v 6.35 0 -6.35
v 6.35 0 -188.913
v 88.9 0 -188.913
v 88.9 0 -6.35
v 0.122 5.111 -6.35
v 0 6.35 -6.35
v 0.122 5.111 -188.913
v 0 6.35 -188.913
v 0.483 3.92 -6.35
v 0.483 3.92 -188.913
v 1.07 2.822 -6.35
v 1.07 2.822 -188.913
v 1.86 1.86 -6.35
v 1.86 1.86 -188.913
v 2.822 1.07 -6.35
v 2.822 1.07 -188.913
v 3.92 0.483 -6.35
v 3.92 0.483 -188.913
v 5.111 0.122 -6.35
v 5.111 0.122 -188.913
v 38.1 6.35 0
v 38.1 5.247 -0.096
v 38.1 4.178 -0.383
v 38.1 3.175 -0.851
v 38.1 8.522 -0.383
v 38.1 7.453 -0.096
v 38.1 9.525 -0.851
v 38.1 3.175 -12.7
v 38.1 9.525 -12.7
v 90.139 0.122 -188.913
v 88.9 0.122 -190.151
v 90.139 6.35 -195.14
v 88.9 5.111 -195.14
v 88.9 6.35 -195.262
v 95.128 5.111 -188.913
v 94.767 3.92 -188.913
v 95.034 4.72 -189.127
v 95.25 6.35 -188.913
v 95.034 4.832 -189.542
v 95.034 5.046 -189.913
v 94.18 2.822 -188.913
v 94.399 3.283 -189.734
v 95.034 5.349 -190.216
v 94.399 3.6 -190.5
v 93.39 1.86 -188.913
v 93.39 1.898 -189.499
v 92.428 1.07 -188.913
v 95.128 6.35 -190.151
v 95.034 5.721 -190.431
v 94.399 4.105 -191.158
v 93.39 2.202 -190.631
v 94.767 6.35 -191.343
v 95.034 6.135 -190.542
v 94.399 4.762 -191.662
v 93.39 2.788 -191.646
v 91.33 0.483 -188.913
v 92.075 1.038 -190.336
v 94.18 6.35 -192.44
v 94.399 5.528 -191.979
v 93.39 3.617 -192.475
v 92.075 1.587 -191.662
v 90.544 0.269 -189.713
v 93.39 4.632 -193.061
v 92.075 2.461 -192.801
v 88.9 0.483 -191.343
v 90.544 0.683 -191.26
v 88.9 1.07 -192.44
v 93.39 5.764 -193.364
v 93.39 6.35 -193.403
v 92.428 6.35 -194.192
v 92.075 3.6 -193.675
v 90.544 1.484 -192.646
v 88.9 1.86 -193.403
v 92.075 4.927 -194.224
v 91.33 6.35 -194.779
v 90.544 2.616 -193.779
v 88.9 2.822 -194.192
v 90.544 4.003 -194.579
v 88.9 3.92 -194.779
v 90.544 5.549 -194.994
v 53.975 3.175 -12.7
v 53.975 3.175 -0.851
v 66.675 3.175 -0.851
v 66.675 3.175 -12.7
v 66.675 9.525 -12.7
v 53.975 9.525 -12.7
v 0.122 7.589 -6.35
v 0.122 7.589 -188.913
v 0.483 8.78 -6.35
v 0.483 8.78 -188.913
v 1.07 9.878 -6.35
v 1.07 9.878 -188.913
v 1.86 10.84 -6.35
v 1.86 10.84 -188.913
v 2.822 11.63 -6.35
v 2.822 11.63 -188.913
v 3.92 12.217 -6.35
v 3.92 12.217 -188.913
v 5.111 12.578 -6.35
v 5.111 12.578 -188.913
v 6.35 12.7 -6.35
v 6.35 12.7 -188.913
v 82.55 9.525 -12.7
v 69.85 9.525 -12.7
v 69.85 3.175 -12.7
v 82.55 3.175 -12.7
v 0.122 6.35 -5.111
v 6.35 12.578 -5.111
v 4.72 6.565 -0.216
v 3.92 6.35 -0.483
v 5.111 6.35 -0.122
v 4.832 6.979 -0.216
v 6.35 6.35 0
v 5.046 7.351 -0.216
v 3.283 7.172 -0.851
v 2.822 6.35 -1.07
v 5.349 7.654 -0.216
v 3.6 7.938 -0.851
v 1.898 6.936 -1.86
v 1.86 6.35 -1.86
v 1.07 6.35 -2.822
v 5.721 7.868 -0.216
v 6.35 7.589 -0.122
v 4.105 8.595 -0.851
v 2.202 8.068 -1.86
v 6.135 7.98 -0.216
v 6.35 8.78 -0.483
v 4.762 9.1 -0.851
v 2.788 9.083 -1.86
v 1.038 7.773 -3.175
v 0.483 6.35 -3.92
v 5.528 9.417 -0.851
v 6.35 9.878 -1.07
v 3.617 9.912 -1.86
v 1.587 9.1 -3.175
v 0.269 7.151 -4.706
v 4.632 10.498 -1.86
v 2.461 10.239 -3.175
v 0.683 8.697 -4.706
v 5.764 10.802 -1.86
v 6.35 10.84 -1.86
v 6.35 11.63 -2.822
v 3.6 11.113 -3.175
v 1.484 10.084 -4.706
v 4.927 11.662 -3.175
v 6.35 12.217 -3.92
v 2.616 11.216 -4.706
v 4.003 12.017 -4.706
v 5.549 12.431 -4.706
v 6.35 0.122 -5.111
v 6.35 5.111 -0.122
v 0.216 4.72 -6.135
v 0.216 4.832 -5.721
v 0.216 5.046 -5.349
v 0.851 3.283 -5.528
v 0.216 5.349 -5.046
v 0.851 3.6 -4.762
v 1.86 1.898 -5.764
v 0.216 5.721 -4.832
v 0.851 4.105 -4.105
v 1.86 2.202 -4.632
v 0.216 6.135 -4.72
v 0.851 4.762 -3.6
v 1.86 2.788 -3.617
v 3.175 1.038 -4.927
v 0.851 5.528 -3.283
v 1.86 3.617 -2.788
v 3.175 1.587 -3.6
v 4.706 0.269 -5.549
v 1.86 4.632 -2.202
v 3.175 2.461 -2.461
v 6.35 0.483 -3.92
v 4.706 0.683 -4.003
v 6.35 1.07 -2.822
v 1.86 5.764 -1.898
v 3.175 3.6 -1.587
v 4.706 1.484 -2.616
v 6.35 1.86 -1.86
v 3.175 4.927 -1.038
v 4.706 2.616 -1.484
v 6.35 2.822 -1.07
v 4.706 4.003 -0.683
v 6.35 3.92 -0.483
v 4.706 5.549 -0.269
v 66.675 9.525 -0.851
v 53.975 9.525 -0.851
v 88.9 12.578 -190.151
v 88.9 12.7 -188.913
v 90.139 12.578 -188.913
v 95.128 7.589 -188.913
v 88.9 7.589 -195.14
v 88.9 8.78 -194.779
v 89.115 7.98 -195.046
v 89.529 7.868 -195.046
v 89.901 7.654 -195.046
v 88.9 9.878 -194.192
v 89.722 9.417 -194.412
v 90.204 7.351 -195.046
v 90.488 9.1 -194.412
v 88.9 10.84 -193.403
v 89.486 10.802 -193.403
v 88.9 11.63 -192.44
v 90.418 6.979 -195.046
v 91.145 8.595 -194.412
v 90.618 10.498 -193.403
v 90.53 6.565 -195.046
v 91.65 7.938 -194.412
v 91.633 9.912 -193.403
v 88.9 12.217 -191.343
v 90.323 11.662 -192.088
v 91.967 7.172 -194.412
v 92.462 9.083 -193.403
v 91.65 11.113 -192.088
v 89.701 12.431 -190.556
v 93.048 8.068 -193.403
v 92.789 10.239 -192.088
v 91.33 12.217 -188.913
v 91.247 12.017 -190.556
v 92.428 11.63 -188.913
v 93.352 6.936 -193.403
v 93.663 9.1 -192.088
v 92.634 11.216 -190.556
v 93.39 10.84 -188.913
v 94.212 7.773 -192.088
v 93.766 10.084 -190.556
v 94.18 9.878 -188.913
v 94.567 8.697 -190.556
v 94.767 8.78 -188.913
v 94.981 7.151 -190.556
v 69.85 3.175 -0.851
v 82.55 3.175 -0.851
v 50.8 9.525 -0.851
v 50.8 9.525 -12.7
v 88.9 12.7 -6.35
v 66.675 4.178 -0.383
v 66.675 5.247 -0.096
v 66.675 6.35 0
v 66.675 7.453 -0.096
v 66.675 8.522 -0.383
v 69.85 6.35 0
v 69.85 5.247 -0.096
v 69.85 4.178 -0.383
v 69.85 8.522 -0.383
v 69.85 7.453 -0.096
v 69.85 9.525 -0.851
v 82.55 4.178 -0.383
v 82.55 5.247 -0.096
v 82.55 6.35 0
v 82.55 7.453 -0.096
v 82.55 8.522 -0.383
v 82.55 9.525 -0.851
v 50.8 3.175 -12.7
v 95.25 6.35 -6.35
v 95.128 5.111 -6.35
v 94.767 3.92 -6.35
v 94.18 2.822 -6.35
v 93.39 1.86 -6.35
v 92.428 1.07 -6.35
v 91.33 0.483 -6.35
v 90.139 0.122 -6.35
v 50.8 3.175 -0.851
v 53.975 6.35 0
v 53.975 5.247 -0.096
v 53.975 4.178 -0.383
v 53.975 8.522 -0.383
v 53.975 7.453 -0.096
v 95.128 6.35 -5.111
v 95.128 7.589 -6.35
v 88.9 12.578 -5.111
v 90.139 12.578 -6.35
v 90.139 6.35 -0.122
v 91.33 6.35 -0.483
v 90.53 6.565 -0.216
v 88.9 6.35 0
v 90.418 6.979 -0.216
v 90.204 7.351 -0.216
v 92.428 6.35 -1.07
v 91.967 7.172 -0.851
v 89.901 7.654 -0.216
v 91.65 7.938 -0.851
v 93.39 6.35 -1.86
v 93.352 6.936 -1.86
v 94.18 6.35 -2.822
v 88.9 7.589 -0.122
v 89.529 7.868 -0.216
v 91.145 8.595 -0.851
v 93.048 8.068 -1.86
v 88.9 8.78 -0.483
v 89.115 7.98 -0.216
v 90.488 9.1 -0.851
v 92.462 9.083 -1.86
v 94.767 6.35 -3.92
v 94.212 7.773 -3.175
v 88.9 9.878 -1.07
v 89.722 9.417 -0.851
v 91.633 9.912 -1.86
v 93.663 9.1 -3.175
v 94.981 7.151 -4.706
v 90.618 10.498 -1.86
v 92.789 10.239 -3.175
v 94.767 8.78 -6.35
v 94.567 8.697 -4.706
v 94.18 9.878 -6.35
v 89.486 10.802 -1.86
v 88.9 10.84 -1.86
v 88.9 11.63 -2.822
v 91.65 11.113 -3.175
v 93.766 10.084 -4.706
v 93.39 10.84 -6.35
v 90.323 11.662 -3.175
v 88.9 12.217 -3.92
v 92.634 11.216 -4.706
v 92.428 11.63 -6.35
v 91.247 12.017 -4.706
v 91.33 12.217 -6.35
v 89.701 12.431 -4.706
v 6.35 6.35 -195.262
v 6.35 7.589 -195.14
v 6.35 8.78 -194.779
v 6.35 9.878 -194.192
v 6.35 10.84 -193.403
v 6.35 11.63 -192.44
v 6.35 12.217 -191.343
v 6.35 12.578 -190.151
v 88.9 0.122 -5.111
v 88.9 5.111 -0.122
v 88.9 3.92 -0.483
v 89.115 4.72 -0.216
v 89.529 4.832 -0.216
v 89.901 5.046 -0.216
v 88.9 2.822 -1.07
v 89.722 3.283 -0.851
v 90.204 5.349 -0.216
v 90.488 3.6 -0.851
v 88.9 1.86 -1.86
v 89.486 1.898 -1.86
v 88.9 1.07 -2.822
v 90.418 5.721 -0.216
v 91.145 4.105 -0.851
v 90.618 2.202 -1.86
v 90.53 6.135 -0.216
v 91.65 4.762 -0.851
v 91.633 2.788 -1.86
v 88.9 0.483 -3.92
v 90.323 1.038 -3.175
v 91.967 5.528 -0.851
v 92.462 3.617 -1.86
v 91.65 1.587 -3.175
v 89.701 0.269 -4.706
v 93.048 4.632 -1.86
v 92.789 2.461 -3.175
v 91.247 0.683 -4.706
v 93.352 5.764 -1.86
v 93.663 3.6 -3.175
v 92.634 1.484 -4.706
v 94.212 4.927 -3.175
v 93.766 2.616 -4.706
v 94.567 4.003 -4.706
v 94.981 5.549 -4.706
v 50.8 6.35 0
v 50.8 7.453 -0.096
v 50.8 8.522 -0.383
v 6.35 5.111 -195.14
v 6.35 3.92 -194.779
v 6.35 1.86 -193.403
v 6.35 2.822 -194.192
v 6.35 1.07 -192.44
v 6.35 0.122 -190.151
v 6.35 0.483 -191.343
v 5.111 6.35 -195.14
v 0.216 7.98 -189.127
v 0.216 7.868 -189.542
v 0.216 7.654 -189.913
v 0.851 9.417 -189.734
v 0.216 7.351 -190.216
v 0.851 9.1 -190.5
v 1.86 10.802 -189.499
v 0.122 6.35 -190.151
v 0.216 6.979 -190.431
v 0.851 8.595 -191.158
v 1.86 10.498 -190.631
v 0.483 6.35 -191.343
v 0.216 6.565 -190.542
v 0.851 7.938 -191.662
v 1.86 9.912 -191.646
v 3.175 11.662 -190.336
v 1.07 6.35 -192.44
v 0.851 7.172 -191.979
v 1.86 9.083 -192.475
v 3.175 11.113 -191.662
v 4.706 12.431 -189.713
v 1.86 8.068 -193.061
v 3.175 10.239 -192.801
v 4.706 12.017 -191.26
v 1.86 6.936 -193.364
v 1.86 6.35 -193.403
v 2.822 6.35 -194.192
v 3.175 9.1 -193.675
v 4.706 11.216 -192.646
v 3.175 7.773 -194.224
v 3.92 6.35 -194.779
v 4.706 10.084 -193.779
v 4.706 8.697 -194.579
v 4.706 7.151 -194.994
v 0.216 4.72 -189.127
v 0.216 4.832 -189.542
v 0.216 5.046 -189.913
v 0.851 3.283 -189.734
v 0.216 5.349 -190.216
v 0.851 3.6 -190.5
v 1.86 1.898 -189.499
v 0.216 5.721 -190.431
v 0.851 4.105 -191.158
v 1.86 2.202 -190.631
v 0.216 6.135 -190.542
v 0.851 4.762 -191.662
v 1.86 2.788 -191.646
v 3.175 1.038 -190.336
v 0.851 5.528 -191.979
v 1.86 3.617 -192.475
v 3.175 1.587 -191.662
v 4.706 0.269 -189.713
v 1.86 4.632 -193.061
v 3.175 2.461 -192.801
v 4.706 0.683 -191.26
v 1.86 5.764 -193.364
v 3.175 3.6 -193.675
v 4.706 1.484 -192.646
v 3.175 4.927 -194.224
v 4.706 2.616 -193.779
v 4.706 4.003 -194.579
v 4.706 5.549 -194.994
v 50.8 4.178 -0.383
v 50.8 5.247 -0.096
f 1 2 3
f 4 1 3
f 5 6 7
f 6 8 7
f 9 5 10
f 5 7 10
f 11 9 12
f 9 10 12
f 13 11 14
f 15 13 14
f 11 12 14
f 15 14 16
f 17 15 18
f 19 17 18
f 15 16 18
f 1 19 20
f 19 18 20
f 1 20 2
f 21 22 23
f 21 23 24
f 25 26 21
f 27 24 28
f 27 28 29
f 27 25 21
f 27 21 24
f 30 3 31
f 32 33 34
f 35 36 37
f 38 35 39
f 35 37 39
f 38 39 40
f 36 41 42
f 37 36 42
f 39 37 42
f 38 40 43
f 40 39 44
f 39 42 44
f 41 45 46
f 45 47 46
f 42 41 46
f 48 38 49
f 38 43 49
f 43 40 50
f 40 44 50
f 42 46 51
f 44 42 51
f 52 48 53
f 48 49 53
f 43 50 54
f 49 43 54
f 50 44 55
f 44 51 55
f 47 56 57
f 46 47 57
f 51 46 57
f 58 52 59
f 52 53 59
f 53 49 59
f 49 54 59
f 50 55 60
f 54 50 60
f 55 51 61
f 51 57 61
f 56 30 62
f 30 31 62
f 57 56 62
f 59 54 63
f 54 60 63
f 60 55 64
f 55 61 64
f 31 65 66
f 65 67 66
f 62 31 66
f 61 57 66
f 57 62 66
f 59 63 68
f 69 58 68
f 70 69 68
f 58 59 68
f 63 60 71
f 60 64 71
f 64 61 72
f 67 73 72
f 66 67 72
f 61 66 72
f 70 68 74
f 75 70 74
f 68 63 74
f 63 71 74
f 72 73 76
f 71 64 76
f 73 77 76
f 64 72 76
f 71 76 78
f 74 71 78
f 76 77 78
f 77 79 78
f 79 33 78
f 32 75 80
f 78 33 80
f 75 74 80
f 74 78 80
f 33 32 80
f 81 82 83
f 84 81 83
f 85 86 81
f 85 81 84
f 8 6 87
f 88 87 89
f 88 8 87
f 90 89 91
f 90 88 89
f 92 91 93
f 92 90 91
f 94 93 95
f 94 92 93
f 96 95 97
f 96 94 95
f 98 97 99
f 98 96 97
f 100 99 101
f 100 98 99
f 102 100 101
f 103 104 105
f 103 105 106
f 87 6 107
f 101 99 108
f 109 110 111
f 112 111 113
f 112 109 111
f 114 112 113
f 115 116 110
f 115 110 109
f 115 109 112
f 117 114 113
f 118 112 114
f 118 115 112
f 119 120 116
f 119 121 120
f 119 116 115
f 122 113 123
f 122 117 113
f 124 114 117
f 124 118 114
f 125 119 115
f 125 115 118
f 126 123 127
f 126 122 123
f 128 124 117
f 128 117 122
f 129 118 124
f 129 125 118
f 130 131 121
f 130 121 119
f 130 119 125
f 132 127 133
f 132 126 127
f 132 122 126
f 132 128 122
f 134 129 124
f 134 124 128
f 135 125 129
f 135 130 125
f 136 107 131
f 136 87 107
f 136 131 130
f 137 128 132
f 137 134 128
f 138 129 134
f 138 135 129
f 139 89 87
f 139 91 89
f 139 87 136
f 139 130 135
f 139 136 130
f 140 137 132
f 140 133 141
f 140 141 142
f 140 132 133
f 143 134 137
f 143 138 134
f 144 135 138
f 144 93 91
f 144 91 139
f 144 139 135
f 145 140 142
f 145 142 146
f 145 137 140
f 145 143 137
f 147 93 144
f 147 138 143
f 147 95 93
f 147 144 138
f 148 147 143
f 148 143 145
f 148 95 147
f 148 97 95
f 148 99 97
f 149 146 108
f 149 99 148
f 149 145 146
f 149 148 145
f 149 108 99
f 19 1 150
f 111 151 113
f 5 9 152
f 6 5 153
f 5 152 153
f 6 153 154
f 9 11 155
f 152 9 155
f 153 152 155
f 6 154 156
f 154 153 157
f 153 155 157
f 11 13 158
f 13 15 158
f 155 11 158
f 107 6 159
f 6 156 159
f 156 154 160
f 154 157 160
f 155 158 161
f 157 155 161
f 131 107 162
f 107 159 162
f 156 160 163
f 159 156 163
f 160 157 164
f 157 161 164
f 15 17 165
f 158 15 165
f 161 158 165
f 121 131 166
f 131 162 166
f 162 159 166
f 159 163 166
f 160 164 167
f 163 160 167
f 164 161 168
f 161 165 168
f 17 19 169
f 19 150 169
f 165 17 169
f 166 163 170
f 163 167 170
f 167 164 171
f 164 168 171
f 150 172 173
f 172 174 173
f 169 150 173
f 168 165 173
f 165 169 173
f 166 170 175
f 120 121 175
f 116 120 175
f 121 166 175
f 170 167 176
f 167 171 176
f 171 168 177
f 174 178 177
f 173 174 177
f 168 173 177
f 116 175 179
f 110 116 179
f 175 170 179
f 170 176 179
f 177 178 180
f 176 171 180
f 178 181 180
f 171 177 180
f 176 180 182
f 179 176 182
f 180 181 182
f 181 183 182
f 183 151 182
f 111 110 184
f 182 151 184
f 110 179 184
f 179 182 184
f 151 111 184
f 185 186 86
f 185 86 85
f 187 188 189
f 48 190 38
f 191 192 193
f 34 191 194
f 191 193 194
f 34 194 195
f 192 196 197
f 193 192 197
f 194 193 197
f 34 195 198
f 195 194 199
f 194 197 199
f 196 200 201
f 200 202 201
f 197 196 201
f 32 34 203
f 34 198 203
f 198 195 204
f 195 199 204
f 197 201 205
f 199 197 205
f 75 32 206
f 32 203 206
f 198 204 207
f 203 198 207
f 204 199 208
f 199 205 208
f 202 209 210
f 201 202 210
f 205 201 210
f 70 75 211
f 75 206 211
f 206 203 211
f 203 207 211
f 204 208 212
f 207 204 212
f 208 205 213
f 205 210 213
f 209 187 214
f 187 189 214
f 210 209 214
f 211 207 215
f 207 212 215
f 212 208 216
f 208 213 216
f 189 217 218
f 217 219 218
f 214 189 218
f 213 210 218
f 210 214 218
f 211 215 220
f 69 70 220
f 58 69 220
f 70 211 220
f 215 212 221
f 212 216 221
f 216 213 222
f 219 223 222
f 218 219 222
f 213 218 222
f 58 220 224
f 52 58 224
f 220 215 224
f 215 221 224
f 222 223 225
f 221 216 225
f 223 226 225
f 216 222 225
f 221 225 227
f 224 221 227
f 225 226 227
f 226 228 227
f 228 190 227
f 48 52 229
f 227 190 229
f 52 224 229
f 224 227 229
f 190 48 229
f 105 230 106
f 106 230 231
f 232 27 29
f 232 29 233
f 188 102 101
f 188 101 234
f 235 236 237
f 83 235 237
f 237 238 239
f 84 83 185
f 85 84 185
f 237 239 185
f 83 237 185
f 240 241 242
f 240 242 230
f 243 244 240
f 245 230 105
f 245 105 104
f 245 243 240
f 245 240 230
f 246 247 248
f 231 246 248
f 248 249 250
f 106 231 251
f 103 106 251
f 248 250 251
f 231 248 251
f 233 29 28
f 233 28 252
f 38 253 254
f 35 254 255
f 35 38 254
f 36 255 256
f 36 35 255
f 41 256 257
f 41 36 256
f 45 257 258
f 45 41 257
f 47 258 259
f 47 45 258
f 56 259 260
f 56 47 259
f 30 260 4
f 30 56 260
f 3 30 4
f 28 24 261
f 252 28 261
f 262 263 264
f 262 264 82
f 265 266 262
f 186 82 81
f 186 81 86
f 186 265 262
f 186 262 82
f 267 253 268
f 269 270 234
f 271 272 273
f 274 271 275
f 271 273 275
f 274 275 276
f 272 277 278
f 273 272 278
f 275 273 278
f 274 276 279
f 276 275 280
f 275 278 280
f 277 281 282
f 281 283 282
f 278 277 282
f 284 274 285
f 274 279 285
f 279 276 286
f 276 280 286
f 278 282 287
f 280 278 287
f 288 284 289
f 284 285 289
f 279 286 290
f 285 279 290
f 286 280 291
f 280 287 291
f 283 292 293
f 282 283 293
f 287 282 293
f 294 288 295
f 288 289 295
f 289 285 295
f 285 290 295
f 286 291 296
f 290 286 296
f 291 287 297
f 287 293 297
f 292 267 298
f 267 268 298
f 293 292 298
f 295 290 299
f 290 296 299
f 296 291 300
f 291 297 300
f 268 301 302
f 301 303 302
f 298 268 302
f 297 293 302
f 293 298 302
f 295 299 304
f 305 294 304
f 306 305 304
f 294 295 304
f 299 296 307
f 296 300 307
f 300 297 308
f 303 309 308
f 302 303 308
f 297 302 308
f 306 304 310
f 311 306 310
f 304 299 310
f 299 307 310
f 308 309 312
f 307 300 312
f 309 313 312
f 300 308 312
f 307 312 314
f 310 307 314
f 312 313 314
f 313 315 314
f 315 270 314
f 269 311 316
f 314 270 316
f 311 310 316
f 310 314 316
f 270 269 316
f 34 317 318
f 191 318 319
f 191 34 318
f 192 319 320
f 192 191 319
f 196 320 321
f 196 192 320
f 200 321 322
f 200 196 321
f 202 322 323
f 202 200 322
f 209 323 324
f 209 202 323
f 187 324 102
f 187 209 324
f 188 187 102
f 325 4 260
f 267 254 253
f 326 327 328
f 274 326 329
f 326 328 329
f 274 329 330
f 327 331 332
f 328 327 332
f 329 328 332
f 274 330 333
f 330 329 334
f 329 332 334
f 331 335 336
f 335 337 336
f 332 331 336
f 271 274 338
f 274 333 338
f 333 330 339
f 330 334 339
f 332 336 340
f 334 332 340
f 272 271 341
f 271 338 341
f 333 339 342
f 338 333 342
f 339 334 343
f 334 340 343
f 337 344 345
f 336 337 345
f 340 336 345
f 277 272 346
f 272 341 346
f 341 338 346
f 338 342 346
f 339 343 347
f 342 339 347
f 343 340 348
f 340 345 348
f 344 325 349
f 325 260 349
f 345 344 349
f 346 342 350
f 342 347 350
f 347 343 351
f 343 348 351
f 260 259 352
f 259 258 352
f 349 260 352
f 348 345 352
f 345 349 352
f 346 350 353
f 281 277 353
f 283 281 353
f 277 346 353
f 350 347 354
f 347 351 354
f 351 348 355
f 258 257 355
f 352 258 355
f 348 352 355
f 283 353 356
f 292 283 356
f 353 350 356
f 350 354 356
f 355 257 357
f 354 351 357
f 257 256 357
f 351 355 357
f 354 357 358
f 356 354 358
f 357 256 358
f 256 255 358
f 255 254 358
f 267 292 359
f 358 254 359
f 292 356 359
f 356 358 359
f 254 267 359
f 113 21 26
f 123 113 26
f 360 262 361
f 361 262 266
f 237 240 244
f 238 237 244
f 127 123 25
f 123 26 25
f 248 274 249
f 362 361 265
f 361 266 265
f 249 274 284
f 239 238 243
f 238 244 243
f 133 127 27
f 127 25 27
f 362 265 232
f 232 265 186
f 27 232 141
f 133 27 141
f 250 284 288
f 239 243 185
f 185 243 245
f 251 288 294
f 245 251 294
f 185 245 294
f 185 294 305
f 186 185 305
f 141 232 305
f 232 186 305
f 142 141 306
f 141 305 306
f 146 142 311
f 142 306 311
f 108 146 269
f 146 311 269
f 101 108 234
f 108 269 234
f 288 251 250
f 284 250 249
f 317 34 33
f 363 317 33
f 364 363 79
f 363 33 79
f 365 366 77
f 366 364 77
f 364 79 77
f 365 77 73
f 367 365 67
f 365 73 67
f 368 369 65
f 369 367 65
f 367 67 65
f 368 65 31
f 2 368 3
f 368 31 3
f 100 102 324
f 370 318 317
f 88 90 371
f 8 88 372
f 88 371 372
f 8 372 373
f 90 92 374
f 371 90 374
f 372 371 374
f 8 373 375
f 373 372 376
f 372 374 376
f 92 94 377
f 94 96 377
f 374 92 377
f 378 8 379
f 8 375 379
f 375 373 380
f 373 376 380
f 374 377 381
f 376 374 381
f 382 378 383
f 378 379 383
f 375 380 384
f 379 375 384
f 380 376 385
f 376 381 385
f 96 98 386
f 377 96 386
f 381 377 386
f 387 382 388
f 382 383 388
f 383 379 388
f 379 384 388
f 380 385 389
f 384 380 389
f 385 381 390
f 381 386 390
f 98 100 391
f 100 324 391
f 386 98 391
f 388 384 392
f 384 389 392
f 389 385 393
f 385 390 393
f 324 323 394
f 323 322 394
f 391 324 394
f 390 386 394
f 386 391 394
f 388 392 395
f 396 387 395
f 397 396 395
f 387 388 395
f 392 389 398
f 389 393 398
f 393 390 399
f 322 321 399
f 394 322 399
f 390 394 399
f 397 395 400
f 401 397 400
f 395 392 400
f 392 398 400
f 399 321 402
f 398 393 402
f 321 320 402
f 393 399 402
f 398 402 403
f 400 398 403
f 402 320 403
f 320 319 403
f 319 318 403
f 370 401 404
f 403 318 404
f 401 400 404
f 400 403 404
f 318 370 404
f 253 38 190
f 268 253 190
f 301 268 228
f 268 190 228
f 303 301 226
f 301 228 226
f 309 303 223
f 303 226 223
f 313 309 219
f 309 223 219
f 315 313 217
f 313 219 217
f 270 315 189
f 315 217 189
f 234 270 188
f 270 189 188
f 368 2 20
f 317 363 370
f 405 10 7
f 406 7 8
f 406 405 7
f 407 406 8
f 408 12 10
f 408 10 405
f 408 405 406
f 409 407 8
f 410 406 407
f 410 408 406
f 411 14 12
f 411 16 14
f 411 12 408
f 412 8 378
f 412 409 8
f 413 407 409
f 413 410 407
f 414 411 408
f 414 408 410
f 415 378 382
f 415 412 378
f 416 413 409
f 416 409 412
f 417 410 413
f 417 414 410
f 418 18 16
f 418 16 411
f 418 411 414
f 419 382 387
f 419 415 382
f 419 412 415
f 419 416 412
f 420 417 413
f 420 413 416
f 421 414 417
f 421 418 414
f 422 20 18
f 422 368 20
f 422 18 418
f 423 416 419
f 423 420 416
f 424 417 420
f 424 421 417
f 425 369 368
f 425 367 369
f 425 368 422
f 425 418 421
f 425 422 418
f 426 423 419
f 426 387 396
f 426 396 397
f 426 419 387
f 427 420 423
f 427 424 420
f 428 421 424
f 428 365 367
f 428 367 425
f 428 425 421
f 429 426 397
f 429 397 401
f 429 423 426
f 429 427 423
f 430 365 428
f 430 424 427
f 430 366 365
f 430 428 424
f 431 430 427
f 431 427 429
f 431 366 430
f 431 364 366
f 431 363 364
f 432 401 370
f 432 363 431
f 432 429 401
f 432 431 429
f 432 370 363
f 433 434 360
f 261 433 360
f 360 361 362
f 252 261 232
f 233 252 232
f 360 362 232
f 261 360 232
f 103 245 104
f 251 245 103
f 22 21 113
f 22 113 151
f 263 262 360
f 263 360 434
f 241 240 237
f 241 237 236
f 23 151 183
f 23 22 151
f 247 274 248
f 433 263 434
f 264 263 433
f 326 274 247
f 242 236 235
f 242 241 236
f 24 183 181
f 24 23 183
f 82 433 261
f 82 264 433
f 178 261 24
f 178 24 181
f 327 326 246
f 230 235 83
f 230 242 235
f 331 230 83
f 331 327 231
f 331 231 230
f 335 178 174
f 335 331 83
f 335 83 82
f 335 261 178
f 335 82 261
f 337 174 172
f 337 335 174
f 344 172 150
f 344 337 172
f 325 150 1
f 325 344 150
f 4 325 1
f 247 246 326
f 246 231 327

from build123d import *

# Parameters (mm, degrees)
SKETCH1_W           = 95.25
SKETCH1_H           = 195.2625
BOSS_EXTRUDE1_DEPTH = 12.7
FILLET1_R           = 6.35
SKETCH2_W           = 12.7
SKETCH2_H           = 6.35
CUT_EXTRUDE1_DEPTH  = 12.7


with BuildPart() as part:
    # Sketch1 → Boss-Extrude1 (new body)
    with BuildSketch(Plane(origin=(0, 0, 0), x_dir=(1, 0, 0), z_dir=(0, 1, 0))):
        with Locations((47.625, 97.63125)):
            Rectangle(SKETCH1_W, SKETCH1_H)
    extrude(amount=BOSS_EXTRUDE1_DEPTH)

    # Fillet1
    fillet1_edges = [part.edges().sort_by_distance(p)[0] for p in [
        (95.25, 12.7, -97.63125),
        (47.625, 12.7, -195.2625),
        (0, 12.7, -97.63125),
        (47.625, 0, -195.2625),
        (95.25, 0, -97.63125),
        (47.625, 0, 0),
        (0, 0, -97.63125),
        (0, 6.35, -195.2625),
        (95.25, 6.35, -195.2625),
        (95.25, 6.35, 0),
        (0, 6.35, 0),
        (47.625, 12.7, 0),
    ]]
    fillet(fillet1_edges, radius=FILLET1_R - 0.0001)  # a hair under: the kernel refuses the full size

    # Sketch2 → Cut-Extrude1 (cut)
    with BuildSketch(Plane.XY):
        with Locations((76.2, 6.35)):
            Rectangle(SKETCH2_W, SKETCH2_H)
        with Locations((60.325, 6.35)):
            Rectangle(SKETCH2_W, SKETCH2_H)
        with Locations((44.45, 6.35)):
            Rectangle(SKETCH2_W, SKETCH2_H)
    extrude(amount=-CUT_EXTRUDE1_DEPTH, mode=Mode.SUBTRACT)


solid = part.part
